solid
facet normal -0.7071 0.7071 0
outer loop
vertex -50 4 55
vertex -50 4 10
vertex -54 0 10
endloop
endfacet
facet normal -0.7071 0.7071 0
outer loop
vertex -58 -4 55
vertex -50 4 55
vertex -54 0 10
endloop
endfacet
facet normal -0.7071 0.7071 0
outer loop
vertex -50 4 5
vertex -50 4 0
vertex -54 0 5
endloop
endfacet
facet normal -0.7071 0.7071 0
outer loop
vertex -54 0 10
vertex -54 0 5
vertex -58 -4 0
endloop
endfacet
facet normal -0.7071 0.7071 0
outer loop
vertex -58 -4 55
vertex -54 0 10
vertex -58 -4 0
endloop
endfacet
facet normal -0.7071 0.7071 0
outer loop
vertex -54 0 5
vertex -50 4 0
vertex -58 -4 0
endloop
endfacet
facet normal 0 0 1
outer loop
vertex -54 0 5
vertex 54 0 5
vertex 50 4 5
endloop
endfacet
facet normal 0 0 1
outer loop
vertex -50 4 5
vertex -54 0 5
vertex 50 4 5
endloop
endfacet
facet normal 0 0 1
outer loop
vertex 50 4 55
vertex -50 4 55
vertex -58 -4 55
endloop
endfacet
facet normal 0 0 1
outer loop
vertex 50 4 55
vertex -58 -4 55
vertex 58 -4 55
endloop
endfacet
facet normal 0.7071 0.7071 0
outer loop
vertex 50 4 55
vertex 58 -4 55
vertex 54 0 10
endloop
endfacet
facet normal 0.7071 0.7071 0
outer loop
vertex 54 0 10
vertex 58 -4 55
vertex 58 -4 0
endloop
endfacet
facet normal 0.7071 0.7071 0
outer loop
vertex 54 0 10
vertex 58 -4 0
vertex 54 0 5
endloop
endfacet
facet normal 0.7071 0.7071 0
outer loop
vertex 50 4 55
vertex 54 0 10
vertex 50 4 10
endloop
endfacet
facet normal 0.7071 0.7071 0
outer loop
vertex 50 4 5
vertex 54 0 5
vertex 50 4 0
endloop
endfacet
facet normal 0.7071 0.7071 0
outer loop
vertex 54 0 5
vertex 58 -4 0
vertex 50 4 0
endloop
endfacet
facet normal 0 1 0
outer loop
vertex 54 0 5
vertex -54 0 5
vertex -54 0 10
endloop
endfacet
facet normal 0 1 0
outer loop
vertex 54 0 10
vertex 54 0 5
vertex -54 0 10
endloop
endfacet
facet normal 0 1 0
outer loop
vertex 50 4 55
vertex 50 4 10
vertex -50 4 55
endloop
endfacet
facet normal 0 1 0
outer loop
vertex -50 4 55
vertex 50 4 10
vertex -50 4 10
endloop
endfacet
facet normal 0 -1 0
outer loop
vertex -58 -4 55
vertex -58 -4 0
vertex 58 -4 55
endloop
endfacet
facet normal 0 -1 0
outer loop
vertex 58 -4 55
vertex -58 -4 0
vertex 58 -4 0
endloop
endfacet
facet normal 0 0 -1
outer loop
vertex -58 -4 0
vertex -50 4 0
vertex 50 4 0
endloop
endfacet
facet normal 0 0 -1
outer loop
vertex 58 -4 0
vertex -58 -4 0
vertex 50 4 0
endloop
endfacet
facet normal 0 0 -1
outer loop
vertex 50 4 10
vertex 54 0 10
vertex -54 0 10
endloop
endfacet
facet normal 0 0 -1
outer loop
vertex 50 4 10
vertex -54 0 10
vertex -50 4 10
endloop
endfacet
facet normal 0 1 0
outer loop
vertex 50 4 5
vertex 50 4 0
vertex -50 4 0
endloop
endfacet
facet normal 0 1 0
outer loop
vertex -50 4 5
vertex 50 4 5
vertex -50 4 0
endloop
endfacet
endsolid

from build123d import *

# Parameters (mm, degrees)
F1_DEPTH = 55
F2_W     = 4
F2_H     = 5
F3_DEPTH = 58


with BuildPart() as f1:
    # F0 (on Top) → F1 (new body)
    with BuildSketch(Plane.XY):
        Polygon((-50, 4), (-58, -4), (58, -4), (50, 4), align=None)
    extrude(amount=F1_DEPTH)

    # F2 (on Right) → F3 (cut, symmetric)
    with BuildSketch(Plane.YZ):
        with Locations((2, 7.5)):
            Rectangle(F2_W, F2_H)
    extrude(amount=F3_DEPTH, both=True, mode=Mode.SUBTRACT)


solid = f1.part
